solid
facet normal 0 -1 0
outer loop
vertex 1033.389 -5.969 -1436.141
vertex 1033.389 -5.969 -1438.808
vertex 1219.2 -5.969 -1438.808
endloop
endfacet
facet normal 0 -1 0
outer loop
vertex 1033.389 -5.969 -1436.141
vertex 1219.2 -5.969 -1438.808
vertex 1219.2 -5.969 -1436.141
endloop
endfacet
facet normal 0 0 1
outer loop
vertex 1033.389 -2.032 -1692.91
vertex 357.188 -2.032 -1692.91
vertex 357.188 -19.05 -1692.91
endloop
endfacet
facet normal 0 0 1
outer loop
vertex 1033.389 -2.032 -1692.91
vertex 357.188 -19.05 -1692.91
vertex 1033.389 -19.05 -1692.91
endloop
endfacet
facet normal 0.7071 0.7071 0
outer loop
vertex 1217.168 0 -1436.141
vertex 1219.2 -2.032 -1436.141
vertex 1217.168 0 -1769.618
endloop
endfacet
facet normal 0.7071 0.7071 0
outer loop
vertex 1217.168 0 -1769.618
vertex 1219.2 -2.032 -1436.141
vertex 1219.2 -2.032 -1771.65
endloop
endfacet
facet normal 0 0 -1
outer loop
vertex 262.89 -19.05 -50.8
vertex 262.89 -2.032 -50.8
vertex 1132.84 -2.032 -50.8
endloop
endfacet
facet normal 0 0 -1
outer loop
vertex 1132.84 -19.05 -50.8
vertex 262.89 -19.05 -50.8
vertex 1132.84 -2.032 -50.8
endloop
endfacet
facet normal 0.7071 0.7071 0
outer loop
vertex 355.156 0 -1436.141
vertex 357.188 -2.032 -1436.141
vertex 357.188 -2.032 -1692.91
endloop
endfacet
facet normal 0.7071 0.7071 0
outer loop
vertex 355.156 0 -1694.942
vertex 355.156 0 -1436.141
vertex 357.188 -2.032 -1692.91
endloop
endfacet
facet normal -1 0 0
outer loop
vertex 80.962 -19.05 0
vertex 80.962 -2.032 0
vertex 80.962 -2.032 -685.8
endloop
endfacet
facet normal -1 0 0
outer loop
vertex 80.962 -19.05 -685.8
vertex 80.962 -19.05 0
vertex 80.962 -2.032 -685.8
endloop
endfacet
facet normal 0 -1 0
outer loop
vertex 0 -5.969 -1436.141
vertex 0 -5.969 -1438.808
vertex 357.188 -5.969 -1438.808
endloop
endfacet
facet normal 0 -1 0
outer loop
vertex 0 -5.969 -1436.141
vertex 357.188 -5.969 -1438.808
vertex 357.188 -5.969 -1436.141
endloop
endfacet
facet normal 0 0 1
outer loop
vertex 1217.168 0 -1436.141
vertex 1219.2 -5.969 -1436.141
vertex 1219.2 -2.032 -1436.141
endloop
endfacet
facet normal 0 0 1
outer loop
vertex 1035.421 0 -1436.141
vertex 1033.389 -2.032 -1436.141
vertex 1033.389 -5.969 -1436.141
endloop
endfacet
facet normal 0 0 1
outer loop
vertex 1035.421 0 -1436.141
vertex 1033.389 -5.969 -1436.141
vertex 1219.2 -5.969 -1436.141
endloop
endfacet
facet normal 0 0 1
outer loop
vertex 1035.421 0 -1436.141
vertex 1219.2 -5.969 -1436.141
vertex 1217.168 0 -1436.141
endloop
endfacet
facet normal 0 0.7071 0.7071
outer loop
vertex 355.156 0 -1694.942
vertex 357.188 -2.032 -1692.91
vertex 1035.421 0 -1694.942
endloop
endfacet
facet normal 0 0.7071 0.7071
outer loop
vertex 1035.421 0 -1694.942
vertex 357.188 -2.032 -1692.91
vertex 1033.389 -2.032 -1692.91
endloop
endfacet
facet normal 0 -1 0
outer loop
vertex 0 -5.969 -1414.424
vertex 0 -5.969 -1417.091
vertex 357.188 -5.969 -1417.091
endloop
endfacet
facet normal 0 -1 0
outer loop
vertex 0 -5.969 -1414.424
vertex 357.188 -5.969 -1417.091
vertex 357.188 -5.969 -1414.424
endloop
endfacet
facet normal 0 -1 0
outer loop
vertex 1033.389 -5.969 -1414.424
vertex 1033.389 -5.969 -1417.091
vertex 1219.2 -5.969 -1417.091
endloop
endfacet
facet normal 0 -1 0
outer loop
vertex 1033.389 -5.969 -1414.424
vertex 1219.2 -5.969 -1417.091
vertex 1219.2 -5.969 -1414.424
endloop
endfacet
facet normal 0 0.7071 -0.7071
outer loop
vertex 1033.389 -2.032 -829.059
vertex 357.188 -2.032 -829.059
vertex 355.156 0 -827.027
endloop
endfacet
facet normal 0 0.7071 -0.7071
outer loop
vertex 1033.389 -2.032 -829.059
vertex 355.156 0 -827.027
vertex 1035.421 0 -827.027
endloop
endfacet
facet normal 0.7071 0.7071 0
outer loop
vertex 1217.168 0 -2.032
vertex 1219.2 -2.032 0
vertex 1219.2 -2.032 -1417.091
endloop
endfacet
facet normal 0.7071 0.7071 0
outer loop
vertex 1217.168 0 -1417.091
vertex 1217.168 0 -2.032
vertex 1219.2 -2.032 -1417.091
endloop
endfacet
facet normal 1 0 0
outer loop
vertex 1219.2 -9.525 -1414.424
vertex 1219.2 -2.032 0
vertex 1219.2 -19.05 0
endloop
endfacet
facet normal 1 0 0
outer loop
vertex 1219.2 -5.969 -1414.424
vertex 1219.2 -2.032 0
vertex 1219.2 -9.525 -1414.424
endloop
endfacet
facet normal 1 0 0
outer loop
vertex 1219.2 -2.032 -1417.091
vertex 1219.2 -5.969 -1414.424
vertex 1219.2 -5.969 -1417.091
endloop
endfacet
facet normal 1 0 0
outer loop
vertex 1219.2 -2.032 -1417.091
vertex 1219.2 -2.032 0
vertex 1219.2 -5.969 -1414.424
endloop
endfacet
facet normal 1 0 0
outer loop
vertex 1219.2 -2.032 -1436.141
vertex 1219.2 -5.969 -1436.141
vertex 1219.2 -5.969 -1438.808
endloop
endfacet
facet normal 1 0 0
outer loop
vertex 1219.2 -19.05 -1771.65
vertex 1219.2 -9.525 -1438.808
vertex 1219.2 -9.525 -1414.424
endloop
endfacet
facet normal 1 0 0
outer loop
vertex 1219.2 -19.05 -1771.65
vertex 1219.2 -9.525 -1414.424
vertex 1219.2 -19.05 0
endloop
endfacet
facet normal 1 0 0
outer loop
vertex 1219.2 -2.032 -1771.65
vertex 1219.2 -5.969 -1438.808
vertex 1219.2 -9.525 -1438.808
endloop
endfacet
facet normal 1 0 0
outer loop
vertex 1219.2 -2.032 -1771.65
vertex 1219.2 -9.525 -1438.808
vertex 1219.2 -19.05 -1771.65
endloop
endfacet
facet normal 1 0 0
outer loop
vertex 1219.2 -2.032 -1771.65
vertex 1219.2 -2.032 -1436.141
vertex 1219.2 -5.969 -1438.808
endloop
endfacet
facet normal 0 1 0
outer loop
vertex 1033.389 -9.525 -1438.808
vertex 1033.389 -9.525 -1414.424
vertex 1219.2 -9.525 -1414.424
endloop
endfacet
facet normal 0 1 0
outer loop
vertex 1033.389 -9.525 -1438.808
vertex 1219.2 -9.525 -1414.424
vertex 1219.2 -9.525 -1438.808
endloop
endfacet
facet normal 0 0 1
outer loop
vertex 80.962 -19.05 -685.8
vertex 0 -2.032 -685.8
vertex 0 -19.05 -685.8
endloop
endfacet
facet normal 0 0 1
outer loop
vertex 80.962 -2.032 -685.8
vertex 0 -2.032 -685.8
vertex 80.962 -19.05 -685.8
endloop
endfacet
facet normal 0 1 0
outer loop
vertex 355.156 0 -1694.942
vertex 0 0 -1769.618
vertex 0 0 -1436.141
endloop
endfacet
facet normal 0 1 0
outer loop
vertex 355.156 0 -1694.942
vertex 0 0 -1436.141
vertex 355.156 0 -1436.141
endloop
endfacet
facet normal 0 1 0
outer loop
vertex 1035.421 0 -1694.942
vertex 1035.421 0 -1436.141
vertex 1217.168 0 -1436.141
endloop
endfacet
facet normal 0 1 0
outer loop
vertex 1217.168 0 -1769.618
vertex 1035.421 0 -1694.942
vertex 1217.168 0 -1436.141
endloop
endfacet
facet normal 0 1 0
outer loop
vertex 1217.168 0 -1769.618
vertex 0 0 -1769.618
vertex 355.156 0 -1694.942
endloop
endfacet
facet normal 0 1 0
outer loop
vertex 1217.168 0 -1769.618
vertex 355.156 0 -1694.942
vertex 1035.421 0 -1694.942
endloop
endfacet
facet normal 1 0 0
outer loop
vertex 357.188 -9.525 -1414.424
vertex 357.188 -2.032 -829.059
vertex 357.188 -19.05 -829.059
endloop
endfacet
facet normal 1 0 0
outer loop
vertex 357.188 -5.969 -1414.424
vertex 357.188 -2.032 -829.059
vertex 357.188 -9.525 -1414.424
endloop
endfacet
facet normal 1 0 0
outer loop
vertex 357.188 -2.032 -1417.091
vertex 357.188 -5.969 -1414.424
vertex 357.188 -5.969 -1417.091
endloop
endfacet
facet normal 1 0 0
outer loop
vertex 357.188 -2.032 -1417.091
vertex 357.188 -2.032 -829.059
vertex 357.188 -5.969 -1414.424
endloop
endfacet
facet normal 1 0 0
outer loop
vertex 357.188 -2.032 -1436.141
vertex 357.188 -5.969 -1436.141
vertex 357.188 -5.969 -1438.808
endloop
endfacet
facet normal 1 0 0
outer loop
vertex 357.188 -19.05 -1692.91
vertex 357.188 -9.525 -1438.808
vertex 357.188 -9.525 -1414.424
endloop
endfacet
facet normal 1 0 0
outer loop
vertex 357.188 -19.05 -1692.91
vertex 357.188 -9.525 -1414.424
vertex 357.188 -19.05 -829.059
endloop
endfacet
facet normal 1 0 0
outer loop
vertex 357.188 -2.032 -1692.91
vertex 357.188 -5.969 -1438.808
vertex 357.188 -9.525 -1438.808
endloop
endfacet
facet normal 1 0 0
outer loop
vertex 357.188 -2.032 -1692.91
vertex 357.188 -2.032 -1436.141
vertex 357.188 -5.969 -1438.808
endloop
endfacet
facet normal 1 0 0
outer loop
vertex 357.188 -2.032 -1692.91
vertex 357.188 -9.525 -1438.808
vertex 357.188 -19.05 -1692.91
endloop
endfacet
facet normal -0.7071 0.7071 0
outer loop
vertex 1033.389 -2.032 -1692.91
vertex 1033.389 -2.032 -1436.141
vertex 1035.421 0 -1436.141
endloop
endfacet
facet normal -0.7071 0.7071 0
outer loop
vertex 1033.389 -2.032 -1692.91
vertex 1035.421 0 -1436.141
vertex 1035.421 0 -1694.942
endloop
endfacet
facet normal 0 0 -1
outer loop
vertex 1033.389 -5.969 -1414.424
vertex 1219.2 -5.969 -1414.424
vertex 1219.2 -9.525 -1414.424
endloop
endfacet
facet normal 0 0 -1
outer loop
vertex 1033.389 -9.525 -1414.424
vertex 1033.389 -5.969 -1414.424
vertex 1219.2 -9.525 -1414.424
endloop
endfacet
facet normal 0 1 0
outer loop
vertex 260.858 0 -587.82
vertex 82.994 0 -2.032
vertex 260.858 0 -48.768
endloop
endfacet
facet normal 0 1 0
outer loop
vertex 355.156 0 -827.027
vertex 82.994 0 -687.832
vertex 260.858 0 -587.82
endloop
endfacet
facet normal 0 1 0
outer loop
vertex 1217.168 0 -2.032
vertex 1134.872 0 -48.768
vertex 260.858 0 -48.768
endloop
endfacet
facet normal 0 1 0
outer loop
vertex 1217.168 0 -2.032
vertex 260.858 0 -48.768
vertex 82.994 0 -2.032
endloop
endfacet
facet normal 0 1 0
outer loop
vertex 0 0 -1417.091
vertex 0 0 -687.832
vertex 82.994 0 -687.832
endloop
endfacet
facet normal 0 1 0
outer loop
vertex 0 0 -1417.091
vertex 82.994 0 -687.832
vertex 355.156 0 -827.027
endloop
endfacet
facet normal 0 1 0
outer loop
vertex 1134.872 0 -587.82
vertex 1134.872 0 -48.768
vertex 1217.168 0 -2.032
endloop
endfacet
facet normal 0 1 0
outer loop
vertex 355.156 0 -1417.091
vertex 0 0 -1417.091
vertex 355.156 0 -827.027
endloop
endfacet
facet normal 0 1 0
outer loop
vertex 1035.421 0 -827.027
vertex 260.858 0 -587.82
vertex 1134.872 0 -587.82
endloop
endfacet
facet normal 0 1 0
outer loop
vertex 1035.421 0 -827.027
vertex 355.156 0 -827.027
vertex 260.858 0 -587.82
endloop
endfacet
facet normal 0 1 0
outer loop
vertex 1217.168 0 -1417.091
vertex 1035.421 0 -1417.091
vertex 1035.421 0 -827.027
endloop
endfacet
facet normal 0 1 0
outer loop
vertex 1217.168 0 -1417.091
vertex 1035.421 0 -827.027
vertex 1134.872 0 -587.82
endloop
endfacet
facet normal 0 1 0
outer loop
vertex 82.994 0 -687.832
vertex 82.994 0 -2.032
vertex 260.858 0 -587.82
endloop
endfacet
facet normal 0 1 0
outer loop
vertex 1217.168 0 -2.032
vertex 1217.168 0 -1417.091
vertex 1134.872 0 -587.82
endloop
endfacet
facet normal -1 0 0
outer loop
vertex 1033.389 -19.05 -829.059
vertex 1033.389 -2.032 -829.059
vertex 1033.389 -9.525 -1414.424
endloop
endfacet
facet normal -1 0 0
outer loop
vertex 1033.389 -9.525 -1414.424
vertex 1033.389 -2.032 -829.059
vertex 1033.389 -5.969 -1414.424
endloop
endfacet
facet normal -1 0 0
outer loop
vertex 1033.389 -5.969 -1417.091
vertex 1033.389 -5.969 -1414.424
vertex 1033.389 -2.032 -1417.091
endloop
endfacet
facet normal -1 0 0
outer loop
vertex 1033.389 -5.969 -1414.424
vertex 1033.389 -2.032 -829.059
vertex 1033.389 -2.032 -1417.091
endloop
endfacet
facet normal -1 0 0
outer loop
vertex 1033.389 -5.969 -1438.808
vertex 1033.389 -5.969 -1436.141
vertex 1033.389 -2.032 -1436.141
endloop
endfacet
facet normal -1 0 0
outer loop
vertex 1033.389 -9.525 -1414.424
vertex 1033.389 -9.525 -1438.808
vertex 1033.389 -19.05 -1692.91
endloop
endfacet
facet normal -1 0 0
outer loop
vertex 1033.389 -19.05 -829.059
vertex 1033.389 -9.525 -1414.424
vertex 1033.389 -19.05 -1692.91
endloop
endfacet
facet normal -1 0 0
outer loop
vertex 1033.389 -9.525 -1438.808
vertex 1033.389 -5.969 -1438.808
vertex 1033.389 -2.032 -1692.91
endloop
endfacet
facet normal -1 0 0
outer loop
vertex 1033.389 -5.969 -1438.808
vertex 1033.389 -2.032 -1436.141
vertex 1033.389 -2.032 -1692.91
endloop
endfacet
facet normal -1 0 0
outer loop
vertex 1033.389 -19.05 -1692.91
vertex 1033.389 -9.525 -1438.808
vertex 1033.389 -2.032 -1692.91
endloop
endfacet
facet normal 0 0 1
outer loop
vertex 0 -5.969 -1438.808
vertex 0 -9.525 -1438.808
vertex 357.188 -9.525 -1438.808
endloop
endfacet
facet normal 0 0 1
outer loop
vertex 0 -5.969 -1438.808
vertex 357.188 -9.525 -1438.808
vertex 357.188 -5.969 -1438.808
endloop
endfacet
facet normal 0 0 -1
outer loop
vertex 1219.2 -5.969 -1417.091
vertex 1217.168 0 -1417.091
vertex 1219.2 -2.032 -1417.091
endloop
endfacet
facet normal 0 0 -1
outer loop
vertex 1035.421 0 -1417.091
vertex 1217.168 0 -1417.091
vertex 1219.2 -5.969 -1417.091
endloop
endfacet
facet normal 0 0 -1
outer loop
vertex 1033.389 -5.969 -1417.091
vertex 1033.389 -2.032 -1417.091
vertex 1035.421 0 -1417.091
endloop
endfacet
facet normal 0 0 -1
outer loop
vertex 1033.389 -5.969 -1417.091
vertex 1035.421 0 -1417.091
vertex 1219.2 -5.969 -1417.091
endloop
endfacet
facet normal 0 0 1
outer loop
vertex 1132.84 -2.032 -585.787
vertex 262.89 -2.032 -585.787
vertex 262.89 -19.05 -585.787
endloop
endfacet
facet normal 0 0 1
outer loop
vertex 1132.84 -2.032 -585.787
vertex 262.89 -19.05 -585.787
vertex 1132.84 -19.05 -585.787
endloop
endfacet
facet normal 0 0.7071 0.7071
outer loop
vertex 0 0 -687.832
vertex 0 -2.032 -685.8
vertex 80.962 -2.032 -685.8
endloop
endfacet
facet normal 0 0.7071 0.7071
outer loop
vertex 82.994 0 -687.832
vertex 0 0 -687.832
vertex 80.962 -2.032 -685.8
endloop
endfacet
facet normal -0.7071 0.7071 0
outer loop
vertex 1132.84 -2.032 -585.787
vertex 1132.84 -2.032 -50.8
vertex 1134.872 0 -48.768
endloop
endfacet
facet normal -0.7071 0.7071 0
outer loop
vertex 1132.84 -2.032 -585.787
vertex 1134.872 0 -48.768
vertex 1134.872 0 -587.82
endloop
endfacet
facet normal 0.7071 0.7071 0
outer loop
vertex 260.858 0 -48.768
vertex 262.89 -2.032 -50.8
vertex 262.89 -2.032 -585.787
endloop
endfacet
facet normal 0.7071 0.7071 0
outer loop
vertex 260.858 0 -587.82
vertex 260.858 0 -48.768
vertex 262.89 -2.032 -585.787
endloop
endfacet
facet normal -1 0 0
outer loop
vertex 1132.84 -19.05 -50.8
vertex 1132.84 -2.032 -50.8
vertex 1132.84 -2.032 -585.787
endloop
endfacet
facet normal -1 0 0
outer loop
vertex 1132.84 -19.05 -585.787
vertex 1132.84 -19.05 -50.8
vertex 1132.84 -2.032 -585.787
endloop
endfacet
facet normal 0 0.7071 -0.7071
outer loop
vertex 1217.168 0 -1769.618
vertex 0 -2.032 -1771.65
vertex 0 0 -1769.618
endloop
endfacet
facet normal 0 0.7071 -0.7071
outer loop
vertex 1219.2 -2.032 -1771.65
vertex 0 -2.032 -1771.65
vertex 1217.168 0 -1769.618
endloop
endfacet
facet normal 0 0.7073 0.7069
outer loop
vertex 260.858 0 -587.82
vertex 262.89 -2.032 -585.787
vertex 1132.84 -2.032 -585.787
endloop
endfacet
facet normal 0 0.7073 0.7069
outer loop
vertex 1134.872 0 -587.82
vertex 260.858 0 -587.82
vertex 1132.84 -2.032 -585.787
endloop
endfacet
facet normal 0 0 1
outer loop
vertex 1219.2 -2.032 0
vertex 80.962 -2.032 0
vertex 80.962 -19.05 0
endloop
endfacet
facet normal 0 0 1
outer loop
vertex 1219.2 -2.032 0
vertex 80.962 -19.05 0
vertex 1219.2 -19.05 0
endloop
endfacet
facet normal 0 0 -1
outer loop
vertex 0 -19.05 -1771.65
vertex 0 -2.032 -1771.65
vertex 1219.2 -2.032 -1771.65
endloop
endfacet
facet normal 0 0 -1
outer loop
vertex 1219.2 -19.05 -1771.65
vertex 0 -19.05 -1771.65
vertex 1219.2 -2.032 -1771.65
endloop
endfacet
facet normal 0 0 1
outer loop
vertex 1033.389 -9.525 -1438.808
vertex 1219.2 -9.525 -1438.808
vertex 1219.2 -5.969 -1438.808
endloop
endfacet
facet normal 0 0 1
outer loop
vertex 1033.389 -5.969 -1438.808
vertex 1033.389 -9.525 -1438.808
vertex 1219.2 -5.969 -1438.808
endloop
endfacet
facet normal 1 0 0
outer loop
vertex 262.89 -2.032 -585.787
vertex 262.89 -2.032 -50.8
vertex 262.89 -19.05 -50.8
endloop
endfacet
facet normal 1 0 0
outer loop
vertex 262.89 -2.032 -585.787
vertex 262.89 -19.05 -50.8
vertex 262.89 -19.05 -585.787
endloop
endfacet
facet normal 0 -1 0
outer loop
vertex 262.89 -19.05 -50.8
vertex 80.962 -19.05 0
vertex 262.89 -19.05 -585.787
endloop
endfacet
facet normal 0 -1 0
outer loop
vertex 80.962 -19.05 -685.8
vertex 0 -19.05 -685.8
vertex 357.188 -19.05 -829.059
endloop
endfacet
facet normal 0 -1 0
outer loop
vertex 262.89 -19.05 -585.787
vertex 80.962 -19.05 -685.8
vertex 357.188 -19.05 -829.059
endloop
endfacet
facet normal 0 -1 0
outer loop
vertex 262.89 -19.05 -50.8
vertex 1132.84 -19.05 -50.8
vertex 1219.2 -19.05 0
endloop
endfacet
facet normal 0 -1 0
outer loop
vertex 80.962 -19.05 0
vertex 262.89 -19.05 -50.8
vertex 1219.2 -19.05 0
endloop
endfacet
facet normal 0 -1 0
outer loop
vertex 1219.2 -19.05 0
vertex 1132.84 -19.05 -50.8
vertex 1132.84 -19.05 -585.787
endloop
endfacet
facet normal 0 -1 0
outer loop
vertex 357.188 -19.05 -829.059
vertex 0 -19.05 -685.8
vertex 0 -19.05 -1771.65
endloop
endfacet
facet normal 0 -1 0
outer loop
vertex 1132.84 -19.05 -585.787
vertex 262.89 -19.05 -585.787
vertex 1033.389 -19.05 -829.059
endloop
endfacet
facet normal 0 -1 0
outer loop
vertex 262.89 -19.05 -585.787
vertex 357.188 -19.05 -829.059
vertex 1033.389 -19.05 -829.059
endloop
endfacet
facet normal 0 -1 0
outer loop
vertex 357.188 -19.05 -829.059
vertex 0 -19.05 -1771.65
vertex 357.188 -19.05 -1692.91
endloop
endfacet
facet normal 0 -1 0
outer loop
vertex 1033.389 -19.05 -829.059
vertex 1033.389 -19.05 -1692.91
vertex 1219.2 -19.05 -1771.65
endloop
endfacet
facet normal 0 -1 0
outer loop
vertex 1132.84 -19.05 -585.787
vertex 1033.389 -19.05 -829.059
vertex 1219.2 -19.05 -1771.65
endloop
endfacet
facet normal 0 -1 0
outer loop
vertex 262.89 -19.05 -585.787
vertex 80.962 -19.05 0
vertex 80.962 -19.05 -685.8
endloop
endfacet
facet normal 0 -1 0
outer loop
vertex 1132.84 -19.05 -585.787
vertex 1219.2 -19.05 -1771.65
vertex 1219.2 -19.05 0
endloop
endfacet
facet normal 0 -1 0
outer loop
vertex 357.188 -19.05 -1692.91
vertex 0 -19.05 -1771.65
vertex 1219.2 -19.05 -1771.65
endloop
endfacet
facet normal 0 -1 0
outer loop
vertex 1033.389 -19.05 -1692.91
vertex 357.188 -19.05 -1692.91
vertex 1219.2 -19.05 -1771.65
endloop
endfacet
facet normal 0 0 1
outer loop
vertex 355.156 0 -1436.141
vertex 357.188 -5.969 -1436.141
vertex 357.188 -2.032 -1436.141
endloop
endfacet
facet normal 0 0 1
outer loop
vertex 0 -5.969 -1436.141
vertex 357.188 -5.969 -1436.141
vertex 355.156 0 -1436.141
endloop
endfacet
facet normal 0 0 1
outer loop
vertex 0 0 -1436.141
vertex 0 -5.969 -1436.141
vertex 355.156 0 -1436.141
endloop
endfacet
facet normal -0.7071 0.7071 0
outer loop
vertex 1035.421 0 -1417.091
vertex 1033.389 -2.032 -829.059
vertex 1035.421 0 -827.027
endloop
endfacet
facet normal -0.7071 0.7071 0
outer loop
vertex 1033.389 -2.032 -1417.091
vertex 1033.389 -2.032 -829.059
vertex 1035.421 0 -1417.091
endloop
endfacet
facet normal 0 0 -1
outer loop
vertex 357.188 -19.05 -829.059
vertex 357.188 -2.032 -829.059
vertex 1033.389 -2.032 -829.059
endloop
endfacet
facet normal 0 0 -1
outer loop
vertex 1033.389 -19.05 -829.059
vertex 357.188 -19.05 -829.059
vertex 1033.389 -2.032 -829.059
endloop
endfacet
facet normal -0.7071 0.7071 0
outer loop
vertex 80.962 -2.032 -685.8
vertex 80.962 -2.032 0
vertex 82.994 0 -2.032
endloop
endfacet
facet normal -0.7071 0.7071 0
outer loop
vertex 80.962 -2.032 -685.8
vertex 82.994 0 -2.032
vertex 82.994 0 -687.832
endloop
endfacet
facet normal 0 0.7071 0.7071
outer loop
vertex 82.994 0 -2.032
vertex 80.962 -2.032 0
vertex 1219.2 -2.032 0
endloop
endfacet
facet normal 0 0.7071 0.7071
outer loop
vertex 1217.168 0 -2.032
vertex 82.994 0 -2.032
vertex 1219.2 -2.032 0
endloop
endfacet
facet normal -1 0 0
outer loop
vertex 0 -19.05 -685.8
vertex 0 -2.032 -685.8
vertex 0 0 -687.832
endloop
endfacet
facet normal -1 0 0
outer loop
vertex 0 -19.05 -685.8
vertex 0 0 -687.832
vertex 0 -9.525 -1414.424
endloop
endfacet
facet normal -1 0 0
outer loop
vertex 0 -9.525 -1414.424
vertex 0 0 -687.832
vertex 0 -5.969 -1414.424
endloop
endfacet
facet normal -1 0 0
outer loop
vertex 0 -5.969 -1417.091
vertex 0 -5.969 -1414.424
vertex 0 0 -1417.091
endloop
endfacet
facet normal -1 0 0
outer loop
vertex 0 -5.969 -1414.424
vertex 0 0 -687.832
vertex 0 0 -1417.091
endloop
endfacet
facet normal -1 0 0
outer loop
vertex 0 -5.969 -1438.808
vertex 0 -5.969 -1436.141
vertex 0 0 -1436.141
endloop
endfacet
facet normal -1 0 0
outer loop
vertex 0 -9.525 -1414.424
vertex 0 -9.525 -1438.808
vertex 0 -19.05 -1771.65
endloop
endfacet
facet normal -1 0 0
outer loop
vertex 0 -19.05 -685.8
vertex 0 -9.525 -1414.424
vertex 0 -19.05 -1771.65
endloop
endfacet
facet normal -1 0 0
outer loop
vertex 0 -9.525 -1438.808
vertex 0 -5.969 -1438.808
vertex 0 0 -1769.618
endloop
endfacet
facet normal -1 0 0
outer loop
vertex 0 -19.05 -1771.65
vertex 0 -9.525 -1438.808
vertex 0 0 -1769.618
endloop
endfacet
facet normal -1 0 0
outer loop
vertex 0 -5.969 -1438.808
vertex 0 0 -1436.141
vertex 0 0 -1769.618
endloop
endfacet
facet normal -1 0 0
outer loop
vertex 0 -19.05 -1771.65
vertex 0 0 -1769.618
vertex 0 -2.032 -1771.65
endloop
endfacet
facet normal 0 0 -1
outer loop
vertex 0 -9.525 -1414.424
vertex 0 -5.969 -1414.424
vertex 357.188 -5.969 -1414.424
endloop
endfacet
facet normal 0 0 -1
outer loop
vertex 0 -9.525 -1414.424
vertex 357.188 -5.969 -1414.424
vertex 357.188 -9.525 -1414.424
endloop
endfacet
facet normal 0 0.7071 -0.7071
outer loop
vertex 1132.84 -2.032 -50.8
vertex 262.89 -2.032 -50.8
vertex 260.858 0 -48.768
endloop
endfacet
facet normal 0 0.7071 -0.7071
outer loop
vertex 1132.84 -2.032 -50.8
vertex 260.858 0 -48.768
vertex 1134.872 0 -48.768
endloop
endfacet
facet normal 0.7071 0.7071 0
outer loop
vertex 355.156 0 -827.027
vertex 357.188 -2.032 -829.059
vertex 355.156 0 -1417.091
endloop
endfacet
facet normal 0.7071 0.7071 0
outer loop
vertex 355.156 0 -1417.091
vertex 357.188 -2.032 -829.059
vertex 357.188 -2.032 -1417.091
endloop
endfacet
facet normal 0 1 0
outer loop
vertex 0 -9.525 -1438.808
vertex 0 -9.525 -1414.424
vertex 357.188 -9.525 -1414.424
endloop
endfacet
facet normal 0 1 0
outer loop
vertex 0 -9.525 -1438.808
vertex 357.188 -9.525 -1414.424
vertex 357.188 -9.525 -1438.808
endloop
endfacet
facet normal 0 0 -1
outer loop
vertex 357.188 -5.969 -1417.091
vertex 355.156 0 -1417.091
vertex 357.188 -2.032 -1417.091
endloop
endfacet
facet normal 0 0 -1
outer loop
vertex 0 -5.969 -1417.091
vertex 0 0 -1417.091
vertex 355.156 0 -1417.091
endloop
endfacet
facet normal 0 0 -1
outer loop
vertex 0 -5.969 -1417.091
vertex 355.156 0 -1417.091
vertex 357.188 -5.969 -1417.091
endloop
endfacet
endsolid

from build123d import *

# Parameters (mm, degrees)
SKETCH1_W           = 1219.2
SKETCH1_H           = 1771.65
BOSS_EXTRUDE1_DEPTH = 19.05
SKETCH2_W           = 869.95
SKETCH2_H           = 534.9875
CUT_EXTRUDE1_DEPTH  = 20.05
SKETCH3_W           = 80.9625
SKETCH3_H           = 685.8
CUT_EXTRUDE2_DEPTH  = 20.05
SKETCH4_W           = 676.20134
SKETCH4_H           = 863.85146
CUT_EXTRUDE3_DEPTH  = 20.05
CUT_EXTRUDE4_DEPTH  = 1220.2
CHAMFER1_SIZE       = 2.032


with BuildPart() as part:
    # Sketch1 → Boss-Extrude1 (new body)
    with BuildSketch(Plane(origin=(0, 0, 0), x_dir=(1, 0, 0), z_dir=(0, 1, 0))):
        with Locations((609.6, 885.825)):
            Rectangle(SKETCH1_W, SKETCH1_H)
    extrude(amount=-BOSS_EXTRUDE1_DEPTH)

    # Sketch2 → Cut-Extrude1 (cut, through all)
    with BuildSketch(Plane(origin=(0, 0, 0), x_dir=(1, 0, 0), z_dir=(0, 1, 0))):
        with Locations((697.865, 318.29375)):
            Rectangle(SKETCH2_W, SKETCH2_H)
    extrude(amount=-CUT_EXTRUDE1_DEPTH, mode=Mode.SUBTRACT)

    # Sketch3 → Cut-Extrude2 (cut, through all)
    with BuildSketch(Plane(origin=(0, 0, 0), x_dir=(1, 0, 0), z_dir=(0, 1, 0))):
        with Locations((40.48125, 342.9)):
            Rectangle(SKETCH3_W, SKETCH3_H)
    extrude(amount=-CUT_EXTRUDE2_DEPTH, mode=Mode.SUBTRACT)

    # Sketch4 → Cut-Extrude3 (cut, through all)
    with BuildSketch(Plane(origin=(0, 0, 0), x_dir=(1, 0, 0), z_dir=(0, 1, 0))):
        with Locations((695.28817, 1260.98427)):
            Rectangle(SKETCH4_W, SKETCH4_H)
    extrude(amount=-CUT_EXTRUDE3_DEPTH, mode=Mode.SUBTRACT)

    # Sketch5 → Cut-Extrude4 (cut, through all)
    with BuildSketch(Plane.ZY):
        Polygon((-1436.1414, 0), (-1417.0914, 0), (-1417.0914, -5.969), (-1414.4244, -5.969), (-1414.4244, -9.525), (-1438.8084, -9.525), (-1438.8084, -5.969), (-1436.1414, -5.969), align=None)
    extrude(amount=-CUT_EXTRUDE4_DEPTH, mode=Mode.SUBTRACT)

    # Chamfer1
    chamfer1_edges = [part.edges().sort_by_distance(p)[0] for p in [
        (1132.84, 0, -318.29375),
        (697.865, 0, -585.7875),
        (262.89, 0, -318.29375),
        (697.865, 0, -50.8),
        (650.08125, 0, 0),
        (80.9625, 0, -342.9),
        (40.48125, 0, -685.8),
        (1033.38884, 0, -1123.07497),
        (695.28817, 0, -1692.91),
        (357.1875, 0, -1564.5257),
        (695.28817, 0, -829.05854),
        (609.6, 0, -1771.65),
        (1219.2, 0, -708.5457),
        (357.1875, 0, -1123.07497),
        (1033.38884, 0, -1564.5257),
        (1219.2, 0, -1603.8957),
    ]]
    chamfer(chamfer1_edges, length=CHAMFER1_SIZE)


solid = part.part
